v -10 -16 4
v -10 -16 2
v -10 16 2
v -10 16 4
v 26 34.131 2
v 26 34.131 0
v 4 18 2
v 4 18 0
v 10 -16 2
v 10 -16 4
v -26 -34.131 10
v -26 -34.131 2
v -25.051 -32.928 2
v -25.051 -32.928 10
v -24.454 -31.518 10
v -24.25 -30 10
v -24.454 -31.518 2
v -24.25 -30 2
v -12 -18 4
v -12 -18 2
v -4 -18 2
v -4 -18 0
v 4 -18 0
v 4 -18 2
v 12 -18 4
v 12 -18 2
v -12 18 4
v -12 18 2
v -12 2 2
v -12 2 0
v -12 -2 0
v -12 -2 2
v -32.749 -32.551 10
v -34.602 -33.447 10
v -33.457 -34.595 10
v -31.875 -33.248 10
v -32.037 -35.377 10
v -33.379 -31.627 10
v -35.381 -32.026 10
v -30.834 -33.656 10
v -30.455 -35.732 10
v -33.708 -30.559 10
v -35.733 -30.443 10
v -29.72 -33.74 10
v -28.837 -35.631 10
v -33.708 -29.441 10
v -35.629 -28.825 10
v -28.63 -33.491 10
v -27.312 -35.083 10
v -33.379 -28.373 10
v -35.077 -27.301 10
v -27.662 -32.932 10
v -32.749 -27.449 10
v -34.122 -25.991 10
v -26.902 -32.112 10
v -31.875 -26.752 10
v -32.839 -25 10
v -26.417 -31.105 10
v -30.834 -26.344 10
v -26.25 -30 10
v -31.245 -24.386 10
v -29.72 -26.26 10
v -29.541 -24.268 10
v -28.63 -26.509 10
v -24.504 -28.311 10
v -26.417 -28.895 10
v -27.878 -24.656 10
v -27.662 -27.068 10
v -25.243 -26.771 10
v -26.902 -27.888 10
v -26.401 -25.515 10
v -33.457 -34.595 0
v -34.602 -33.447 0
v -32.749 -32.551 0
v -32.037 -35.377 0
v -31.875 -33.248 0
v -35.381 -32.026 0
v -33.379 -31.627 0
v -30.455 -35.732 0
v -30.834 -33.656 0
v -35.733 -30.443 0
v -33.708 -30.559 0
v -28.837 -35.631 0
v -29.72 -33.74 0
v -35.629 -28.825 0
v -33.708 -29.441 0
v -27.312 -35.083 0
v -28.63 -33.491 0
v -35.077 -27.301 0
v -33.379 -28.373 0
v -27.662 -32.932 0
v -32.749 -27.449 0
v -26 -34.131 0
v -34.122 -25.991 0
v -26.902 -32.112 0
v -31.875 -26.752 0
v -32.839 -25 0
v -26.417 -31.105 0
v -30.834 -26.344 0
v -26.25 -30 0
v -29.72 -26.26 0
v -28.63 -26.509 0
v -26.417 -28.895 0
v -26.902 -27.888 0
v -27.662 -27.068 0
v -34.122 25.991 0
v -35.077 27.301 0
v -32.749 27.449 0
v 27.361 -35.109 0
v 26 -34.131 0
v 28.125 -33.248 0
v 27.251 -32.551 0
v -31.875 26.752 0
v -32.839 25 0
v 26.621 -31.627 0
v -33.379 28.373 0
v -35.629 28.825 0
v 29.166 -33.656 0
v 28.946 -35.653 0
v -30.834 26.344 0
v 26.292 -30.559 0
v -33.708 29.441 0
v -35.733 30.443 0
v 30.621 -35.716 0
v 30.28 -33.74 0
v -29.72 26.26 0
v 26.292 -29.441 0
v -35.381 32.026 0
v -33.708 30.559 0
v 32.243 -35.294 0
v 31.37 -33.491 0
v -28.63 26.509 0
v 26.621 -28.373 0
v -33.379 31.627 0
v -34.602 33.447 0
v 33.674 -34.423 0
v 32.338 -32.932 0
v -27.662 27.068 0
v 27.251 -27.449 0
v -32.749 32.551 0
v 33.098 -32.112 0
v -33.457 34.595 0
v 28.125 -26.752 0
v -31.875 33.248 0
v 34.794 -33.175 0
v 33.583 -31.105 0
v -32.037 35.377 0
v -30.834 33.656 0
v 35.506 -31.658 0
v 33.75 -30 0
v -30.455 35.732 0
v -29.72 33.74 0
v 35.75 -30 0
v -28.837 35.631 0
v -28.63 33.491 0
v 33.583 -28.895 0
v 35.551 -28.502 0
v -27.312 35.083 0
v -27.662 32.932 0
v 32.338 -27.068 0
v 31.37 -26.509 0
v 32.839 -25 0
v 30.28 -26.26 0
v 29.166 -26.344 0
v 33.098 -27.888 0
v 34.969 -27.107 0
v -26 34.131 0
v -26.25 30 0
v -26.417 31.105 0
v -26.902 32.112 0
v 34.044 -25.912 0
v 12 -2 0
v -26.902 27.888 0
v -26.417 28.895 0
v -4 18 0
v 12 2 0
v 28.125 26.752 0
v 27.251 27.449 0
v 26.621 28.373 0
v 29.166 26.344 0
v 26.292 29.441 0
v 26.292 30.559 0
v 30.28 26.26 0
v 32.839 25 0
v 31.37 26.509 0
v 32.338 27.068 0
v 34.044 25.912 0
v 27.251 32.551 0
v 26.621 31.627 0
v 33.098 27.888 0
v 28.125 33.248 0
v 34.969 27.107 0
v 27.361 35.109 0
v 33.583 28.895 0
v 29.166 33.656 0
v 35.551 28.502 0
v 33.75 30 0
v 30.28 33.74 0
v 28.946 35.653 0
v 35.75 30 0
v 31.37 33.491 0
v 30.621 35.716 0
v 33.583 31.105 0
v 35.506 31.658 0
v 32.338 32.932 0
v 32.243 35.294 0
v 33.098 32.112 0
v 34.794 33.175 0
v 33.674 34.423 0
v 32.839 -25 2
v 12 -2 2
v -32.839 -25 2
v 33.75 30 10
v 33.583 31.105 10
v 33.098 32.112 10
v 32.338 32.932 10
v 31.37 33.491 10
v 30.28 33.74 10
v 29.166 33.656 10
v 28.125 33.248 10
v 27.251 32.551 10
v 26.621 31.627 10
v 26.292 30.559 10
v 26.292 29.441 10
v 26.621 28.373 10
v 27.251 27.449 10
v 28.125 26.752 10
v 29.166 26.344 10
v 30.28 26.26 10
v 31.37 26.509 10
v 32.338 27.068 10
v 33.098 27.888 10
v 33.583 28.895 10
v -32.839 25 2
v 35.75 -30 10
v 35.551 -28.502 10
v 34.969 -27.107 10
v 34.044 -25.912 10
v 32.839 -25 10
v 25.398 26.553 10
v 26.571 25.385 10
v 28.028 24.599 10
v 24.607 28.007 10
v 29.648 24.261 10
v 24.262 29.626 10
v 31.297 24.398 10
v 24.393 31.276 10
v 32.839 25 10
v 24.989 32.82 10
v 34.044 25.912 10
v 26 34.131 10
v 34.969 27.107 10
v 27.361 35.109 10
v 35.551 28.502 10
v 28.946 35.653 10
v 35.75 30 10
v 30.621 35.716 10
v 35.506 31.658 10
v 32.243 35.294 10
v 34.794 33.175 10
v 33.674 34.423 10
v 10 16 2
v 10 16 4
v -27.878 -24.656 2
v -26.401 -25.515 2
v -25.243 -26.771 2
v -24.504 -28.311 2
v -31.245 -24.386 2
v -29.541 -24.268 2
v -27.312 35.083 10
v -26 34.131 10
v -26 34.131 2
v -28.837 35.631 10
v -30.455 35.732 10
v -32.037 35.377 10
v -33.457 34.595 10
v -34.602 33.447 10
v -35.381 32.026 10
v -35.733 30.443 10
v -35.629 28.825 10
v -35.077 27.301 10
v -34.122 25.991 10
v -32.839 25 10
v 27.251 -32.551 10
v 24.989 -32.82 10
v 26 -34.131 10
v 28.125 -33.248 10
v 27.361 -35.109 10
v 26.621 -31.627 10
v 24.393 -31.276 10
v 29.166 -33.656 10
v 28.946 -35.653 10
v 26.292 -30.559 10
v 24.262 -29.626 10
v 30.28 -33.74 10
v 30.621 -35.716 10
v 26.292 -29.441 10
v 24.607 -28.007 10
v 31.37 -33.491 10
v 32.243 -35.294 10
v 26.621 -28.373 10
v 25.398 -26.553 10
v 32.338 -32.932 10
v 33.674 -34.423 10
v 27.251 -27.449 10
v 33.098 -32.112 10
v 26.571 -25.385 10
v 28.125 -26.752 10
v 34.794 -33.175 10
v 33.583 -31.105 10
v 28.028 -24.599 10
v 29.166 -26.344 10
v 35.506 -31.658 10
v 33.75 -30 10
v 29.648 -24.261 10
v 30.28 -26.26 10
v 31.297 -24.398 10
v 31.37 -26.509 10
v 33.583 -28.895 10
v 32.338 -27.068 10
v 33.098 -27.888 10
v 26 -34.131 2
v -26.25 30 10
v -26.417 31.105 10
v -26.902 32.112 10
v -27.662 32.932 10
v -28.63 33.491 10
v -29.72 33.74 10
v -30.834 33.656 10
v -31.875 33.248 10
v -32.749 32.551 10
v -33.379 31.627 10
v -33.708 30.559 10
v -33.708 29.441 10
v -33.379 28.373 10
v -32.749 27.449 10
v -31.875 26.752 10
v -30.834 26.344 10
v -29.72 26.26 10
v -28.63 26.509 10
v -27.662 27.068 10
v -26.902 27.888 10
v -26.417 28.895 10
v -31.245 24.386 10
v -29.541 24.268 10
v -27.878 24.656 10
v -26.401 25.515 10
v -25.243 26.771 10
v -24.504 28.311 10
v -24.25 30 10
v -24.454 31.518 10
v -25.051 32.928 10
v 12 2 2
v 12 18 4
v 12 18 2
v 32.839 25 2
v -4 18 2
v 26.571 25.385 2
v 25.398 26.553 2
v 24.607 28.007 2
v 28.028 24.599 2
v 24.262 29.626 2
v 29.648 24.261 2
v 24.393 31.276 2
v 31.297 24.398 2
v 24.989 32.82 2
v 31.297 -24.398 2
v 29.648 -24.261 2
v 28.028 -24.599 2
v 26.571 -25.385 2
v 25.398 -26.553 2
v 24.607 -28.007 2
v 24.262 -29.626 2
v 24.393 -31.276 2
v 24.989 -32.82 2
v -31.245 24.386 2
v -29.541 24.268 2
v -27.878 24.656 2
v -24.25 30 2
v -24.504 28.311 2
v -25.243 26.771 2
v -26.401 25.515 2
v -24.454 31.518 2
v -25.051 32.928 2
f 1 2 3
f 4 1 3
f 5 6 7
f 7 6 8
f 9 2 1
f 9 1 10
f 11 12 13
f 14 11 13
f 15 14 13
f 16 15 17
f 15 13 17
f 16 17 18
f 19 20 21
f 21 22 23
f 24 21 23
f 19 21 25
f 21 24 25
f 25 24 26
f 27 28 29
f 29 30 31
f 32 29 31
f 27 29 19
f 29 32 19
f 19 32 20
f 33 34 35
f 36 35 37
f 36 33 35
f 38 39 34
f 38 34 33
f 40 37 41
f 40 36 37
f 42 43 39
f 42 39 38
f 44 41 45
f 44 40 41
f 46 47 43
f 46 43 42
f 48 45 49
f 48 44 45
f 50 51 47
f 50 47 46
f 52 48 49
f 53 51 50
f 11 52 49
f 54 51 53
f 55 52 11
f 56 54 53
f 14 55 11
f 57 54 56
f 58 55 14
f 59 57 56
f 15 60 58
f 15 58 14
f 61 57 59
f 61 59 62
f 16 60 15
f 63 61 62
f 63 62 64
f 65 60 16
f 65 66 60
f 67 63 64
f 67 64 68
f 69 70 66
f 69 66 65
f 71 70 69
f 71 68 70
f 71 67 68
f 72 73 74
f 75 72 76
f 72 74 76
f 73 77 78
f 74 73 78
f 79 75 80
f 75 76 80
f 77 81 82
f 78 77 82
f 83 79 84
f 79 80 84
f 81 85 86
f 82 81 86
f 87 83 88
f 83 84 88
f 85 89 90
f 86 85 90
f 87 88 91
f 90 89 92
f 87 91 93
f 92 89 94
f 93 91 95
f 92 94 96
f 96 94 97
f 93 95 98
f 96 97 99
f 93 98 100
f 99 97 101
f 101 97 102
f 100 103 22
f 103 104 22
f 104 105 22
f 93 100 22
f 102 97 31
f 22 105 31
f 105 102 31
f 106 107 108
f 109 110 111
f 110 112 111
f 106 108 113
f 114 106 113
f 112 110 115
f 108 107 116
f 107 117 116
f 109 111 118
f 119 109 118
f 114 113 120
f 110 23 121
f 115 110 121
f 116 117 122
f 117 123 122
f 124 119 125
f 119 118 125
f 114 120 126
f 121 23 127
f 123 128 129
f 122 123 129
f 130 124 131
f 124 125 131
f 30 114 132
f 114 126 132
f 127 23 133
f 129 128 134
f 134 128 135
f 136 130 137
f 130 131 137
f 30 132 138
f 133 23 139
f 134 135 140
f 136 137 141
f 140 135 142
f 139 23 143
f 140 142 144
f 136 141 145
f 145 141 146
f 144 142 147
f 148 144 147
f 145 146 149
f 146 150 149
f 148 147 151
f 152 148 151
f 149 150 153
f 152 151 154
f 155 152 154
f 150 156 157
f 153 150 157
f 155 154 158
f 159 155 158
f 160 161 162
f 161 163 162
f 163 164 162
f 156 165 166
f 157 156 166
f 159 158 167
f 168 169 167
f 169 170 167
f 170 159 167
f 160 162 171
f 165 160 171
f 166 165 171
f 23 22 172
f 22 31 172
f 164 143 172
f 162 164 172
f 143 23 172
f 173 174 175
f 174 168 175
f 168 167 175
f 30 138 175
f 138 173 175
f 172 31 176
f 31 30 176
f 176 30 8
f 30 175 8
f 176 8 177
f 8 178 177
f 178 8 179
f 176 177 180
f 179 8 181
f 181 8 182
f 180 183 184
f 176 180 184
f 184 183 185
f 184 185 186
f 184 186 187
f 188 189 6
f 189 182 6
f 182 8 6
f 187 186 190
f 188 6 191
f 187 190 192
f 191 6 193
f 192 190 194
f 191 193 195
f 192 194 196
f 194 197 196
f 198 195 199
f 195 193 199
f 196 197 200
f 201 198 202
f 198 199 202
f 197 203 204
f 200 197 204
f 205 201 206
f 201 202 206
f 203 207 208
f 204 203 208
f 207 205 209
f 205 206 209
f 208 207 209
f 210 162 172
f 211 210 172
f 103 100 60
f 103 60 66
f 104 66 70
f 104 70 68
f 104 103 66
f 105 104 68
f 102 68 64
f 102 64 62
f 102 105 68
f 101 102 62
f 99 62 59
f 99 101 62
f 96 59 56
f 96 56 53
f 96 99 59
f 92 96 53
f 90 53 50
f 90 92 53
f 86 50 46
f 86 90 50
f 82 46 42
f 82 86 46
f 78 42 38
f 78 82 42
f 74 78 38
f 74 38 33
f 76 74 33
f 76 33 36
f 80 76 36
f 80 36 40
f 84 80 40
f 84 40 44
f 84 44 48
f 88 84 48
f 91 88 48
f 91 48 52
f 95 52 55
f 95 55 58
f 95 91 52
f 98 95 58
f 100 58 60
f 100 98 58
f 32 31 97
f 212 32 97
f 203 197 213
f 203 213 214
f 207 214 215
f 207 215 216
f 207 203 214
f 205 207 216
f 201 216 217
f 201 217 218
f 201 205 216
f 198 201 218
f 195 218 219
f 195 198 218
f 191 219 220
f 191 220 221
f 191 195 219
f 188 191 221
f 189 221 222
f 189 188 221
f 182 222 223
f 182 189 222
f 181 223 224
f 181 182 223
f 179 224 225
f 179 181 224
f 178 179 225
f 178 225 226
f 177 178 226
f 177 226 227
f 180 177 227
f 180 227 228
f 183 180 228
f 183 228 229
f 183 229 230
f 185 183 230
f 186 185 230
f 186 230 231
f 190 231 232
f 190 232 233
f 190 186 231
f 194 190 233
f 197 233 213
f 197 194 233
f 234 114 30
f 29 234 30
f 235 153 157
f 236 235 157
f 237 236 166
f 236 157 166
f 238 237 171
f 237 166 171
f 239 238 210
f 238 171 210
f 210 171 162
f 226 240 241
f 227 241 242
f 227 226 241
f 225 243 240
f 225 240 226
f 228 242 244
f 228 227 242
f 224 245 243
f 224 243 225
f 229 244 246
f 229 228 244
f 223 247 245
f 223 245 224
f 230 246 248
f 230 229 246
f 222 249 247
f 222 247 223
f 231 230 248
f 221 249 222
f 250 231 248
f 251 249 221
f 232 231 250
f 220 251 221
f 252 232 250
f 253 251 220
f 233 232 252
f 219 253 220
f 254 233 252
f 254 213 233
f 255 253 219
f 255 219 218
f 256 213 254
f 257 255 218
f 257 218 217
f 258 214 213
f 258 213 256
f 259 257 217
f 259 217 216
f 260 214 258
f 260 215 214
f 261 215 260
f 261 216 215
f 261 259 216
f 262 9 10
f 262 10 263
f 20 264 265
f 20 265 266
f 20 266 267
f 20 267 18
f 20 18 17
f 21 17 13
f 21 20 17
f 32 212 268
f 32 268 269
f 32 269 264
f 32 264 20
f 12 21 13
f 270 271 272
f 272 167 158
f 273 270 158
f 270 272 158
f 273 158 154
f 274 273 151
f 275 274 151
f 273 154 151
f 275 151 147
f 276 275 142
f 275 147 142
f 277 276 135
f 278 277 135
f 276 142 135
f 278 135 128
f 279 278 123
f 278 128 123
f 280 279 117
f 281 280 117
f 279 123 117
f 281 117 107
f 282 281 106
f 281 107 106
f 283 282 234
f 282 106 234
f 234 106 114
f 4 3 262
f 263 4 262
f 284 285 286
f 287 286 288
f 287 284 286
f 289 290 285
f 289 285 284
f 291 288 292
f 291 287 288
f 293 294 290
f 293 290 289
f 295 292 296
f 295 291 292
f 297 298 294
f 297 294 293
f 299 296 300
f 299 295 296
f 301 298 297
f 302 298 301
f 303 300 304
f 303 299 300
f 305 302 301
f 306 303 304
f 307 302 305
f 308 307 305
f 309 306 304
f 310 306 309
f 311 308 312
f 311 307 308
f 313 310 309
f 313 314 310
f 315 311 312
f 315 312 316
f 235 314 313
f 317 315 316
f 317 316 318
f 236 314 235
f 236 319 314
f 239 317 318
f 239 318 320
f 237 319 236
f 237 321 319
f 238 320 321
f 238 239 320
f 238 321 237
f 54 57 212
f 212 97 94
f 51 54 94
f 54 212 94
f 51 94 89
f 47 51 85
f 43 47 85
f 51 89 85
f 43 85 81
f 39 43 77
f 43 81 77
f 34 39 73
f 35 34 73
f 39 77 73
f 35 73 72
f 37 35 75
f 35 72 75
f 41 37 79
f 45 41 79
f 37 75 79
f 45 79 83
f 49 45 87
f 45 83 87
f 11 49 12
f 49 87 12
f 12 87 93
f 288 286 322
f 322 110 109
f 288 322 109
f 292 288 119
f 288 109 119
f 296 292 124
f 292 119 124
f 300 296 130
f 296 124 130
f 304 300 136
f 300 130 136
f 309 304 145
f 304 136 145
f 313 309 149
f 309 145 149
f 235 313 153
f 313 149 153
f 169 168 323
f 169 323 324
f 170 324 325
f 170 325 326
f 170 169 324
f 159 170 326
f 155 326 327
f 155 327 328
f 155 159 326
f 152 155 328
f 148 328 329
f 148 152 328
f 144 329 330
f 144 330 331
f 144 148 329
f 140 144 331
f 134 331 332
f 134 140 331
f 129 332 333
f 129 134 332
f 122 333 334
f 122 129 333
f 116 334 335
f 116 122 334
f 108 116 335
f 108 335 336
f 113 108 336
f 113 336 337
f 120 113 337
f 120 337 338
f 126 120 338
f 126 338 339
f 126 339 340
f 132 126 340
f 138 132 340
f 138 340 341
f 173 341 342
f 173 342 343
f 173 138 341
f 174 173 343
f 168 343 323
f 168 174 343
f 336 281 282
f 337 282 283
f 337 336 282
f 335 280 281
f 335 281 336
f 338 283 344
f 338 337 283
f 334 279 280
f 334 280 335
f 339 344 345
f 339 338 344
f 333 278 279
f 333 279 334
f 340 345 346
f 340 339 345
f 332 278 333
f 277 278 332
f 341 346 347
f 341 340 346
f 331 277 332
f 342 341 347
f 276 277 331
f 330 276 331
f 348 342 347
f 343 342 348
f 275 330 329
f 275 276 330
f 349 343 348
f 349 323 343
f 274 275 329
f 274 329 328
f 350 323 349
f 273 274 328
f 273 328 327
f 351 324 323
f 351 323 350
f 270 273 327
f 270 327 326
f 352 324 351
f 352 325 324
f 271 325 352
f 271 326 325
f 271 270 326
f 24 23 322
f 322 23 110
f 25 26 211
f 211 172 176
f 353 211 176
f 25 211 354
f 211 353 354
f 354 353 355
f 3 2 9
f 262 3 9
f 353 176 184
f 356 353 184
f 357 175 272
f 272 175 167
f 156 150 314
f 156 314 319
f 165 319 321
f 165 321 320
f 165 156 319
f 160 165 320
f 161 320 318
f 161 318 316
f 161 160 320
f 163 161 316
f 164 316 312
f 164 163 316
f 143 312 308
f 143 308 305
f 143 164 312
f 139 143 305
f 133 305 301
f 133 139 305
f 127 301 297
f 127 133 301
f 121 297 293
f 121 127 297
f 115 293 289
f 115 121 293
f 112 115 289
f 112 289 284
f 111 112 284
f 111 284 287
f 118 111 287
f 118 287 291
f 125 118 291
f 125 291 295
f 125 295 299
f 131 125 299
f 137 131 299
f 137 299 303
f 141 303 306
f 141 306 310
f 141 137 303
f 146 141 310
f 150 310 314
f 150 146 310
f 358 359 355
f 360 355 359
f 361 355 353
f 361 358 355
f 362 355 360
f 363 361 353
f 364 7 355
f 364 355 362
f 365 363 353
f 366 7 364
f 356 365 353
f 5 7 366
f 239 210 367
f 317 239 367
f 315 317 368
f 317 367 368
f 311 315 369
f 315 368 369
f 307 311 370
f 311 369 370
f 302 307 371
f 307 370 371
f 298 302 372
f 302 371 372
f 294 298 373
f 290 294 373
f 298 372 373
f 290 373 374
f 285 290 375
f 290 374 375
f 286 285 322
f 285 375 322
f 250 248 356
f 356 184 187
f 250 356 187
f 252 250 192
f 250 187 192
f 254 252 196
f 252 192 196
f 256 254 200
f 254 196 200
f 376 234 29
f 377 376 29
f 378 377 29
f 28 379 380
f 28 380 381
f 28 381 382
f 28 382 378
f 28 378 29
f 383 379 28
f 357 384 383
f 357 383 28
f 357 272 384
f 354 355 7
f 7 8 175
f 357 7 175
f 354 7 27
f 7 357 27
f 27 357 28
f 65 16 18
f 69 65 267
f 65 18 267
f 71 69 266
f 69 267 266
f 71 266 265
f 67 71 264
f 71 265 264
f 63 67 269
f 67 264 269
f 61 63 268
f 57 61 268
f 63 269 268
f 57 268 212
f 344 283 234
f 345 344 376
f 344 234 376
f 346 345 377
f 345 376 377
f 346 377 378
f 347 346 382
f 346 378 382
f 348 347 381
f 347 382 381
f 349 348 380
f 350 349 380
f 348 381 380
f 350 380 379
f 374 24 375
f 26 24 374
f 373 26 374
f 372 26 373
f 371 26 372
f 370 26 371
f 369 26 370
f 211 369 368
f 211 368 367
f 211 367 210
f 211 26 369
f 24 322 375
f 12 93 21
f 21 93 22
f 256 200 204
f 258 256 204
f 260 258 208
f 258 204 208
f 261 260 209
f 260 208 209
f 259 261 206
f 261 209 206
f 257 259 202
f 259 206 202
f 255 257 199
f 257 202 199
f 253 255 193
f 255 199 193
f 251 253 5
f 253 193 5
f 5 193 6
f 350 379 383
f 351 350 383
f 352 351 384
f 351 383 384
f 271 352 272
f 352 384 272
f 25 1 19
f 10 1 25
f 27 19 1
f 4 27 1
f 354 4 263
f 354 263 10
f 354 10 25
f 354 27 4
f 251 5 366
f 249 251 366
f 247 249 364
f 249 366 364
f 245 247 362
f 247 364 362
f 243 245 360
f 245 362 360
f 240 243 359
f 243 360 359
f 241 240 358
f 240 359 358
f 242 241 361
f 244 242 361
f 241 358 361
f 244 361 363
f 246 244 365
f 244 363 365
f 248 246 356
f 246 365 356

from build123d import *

# Parameters (mm, degrees)
F0_W     = 20
F0_H     = 32
F1_DEPTH = 2
F2_DEPTH = 4
F0_R     = 3.75
F3_DEPTH = 10


with BuildPart() as f1:
    # F0 (on Top) → F1 (new body)
    with BuildSketch(Plane.XY):
        with BuildLine():
            Line((-12, 2), (-12, 18))
            Line((-12, 18), (-4, 18))
            Line((-4, 18), (-26, 34.130678))
            ThreePointArc((-26, 34.130678), (-24.705545, 32.243045), (-24.25, 30))
            ThreePointArc((-24.25, 30), (-27.107282, 25.030626), (-32.839454, 25))
            Line((-32.839454, 25), (-12, 2))
        make_face()
        with BuildLine():
            Line((26, 34.130678), (4, 18))
            Line((4, 18), (12, 18))
            Line((12, 18), (12, 2))
            Line((12, 2), (32.839454, 25))
            ThreePointArc((32.839454, 25), (25.397931, 26.55276), (26, 34.130678))
        make_face()
        with BuildLine():
            Line((32.839454, -25), (12, -2))
            Line((12, -2), (12, -18))
            Line((12, -18), (4, -18))
            Line((4, -18), (26, -34.130678))
            ThreePointArc((26, -34.130678), (25.397931, -26.55276), (32.839454, -25))
        make_face()
        with BuildLine():
            Line((-12, -18), (-12, -2))
            Line((-12, -2), (-32.839454, -25))
            ThreePointArc((-32.839454, -25), (-27.107282, -25.030626), (-24.25, -30))
            ThreePointArc((-24.25, -30), (-24.705545, -32.243045), (-26, -34.130678))
            Line((-26, -34.130678), (-4, -18))
            Line((-4, -18), (-12, -18))
        make_face()
        Polygon((-4, 18), (-12, 18), (-12, 2), (-12, -2), (-12, -18), (-4, -18), (4, -18), (12, -18), (12, -2), (12, 2), (12, 18), (4, 18), align=None)
        Rectangle(F0_W, F0_H, mode=Mode.SUBTRACT)
        Rectangle(F0_W, F0_H)
    extrude(amount=F1_DEPTH)

    # F0 (on Top) → F2 (join)
    with BuildSketch(Plane.XY):
        Polygon((-4, 18), (-12, 18), (-12, 2), (-12, -2), (-12, -18), (-4, -18), (4, -18), (12, -18), (12, -2), (12, 2), (12, 18), (4, 18), align=None)
        Rectangle(F0_W, F0_H, mode=Mode.SUBTRACT)
    extrude(amount=F2_DEPTH)

    # F0 (on Top) → F3 (join)
    with BuildSketch(Plane.XY):
        with BuildLine():
            ThreePointArc((-24.25, -30), (-27.107282, -25.030626), (-32.839454, -25))
            ThreePointArc((-32.839454, -25), (-34.602069, -33.44724), (-26, -34.130678))
            ThreePointArc((-26, -34.130678), (-24.705545, -32.243045), (-24.25, -30))
        make_face()
        with Locations((-30, -30)):
            Circle(F0_R, mode=Mode.SUBTRACT)
        with BuildLine():
            ThreePointArc((35.75, -30), (34.969374, -27.107282), (32.839454, -25))
            ThreePointArc((32.839454, -25), (25.397931, -26.55276), (26, -34.130678))
            ThreePointArc((26, -34.130678), (32.243045, -35.294455), (35.75, -30))
        make_face()
        with Locations((30, -30)):
            Circle(F0_R, mode=Mode.SUBTRACT)
        with BuildLine():
            ThreePointArc((35.75, 30), (32.243045, 35.294455), (26, 34.130678))
            ThreePointArc((26, 34.130678), (25.397931, 26.55276), (32.839454, 25))
            ThreePointArc((32.839454, 25), (34.969374, 27.107282), (35.75, 30))
        make_face()
        with Locations((30, 30)):
            Circle(F0_R, mode=Mode.SUBTRACT)
        with BuildLine():
            ThreePointArc((-24.25, 30), (-24.705545, 32.243045), (-26, 34.130678))
            ThreePointArc((-26, 34.130678), (-34.602069, 33.44724), (-32.839454, 25))
            ThreePointArc((-32.839454, 25), (-27.107282, 25.030626), (-24.25, 30))
        make_face()
        with Locations((-30, 30)):
            Circle(F0_R, mode=Mode.SUBTRACT)
    extrude(amount=F3_DEPTH)


solid = f1.part
